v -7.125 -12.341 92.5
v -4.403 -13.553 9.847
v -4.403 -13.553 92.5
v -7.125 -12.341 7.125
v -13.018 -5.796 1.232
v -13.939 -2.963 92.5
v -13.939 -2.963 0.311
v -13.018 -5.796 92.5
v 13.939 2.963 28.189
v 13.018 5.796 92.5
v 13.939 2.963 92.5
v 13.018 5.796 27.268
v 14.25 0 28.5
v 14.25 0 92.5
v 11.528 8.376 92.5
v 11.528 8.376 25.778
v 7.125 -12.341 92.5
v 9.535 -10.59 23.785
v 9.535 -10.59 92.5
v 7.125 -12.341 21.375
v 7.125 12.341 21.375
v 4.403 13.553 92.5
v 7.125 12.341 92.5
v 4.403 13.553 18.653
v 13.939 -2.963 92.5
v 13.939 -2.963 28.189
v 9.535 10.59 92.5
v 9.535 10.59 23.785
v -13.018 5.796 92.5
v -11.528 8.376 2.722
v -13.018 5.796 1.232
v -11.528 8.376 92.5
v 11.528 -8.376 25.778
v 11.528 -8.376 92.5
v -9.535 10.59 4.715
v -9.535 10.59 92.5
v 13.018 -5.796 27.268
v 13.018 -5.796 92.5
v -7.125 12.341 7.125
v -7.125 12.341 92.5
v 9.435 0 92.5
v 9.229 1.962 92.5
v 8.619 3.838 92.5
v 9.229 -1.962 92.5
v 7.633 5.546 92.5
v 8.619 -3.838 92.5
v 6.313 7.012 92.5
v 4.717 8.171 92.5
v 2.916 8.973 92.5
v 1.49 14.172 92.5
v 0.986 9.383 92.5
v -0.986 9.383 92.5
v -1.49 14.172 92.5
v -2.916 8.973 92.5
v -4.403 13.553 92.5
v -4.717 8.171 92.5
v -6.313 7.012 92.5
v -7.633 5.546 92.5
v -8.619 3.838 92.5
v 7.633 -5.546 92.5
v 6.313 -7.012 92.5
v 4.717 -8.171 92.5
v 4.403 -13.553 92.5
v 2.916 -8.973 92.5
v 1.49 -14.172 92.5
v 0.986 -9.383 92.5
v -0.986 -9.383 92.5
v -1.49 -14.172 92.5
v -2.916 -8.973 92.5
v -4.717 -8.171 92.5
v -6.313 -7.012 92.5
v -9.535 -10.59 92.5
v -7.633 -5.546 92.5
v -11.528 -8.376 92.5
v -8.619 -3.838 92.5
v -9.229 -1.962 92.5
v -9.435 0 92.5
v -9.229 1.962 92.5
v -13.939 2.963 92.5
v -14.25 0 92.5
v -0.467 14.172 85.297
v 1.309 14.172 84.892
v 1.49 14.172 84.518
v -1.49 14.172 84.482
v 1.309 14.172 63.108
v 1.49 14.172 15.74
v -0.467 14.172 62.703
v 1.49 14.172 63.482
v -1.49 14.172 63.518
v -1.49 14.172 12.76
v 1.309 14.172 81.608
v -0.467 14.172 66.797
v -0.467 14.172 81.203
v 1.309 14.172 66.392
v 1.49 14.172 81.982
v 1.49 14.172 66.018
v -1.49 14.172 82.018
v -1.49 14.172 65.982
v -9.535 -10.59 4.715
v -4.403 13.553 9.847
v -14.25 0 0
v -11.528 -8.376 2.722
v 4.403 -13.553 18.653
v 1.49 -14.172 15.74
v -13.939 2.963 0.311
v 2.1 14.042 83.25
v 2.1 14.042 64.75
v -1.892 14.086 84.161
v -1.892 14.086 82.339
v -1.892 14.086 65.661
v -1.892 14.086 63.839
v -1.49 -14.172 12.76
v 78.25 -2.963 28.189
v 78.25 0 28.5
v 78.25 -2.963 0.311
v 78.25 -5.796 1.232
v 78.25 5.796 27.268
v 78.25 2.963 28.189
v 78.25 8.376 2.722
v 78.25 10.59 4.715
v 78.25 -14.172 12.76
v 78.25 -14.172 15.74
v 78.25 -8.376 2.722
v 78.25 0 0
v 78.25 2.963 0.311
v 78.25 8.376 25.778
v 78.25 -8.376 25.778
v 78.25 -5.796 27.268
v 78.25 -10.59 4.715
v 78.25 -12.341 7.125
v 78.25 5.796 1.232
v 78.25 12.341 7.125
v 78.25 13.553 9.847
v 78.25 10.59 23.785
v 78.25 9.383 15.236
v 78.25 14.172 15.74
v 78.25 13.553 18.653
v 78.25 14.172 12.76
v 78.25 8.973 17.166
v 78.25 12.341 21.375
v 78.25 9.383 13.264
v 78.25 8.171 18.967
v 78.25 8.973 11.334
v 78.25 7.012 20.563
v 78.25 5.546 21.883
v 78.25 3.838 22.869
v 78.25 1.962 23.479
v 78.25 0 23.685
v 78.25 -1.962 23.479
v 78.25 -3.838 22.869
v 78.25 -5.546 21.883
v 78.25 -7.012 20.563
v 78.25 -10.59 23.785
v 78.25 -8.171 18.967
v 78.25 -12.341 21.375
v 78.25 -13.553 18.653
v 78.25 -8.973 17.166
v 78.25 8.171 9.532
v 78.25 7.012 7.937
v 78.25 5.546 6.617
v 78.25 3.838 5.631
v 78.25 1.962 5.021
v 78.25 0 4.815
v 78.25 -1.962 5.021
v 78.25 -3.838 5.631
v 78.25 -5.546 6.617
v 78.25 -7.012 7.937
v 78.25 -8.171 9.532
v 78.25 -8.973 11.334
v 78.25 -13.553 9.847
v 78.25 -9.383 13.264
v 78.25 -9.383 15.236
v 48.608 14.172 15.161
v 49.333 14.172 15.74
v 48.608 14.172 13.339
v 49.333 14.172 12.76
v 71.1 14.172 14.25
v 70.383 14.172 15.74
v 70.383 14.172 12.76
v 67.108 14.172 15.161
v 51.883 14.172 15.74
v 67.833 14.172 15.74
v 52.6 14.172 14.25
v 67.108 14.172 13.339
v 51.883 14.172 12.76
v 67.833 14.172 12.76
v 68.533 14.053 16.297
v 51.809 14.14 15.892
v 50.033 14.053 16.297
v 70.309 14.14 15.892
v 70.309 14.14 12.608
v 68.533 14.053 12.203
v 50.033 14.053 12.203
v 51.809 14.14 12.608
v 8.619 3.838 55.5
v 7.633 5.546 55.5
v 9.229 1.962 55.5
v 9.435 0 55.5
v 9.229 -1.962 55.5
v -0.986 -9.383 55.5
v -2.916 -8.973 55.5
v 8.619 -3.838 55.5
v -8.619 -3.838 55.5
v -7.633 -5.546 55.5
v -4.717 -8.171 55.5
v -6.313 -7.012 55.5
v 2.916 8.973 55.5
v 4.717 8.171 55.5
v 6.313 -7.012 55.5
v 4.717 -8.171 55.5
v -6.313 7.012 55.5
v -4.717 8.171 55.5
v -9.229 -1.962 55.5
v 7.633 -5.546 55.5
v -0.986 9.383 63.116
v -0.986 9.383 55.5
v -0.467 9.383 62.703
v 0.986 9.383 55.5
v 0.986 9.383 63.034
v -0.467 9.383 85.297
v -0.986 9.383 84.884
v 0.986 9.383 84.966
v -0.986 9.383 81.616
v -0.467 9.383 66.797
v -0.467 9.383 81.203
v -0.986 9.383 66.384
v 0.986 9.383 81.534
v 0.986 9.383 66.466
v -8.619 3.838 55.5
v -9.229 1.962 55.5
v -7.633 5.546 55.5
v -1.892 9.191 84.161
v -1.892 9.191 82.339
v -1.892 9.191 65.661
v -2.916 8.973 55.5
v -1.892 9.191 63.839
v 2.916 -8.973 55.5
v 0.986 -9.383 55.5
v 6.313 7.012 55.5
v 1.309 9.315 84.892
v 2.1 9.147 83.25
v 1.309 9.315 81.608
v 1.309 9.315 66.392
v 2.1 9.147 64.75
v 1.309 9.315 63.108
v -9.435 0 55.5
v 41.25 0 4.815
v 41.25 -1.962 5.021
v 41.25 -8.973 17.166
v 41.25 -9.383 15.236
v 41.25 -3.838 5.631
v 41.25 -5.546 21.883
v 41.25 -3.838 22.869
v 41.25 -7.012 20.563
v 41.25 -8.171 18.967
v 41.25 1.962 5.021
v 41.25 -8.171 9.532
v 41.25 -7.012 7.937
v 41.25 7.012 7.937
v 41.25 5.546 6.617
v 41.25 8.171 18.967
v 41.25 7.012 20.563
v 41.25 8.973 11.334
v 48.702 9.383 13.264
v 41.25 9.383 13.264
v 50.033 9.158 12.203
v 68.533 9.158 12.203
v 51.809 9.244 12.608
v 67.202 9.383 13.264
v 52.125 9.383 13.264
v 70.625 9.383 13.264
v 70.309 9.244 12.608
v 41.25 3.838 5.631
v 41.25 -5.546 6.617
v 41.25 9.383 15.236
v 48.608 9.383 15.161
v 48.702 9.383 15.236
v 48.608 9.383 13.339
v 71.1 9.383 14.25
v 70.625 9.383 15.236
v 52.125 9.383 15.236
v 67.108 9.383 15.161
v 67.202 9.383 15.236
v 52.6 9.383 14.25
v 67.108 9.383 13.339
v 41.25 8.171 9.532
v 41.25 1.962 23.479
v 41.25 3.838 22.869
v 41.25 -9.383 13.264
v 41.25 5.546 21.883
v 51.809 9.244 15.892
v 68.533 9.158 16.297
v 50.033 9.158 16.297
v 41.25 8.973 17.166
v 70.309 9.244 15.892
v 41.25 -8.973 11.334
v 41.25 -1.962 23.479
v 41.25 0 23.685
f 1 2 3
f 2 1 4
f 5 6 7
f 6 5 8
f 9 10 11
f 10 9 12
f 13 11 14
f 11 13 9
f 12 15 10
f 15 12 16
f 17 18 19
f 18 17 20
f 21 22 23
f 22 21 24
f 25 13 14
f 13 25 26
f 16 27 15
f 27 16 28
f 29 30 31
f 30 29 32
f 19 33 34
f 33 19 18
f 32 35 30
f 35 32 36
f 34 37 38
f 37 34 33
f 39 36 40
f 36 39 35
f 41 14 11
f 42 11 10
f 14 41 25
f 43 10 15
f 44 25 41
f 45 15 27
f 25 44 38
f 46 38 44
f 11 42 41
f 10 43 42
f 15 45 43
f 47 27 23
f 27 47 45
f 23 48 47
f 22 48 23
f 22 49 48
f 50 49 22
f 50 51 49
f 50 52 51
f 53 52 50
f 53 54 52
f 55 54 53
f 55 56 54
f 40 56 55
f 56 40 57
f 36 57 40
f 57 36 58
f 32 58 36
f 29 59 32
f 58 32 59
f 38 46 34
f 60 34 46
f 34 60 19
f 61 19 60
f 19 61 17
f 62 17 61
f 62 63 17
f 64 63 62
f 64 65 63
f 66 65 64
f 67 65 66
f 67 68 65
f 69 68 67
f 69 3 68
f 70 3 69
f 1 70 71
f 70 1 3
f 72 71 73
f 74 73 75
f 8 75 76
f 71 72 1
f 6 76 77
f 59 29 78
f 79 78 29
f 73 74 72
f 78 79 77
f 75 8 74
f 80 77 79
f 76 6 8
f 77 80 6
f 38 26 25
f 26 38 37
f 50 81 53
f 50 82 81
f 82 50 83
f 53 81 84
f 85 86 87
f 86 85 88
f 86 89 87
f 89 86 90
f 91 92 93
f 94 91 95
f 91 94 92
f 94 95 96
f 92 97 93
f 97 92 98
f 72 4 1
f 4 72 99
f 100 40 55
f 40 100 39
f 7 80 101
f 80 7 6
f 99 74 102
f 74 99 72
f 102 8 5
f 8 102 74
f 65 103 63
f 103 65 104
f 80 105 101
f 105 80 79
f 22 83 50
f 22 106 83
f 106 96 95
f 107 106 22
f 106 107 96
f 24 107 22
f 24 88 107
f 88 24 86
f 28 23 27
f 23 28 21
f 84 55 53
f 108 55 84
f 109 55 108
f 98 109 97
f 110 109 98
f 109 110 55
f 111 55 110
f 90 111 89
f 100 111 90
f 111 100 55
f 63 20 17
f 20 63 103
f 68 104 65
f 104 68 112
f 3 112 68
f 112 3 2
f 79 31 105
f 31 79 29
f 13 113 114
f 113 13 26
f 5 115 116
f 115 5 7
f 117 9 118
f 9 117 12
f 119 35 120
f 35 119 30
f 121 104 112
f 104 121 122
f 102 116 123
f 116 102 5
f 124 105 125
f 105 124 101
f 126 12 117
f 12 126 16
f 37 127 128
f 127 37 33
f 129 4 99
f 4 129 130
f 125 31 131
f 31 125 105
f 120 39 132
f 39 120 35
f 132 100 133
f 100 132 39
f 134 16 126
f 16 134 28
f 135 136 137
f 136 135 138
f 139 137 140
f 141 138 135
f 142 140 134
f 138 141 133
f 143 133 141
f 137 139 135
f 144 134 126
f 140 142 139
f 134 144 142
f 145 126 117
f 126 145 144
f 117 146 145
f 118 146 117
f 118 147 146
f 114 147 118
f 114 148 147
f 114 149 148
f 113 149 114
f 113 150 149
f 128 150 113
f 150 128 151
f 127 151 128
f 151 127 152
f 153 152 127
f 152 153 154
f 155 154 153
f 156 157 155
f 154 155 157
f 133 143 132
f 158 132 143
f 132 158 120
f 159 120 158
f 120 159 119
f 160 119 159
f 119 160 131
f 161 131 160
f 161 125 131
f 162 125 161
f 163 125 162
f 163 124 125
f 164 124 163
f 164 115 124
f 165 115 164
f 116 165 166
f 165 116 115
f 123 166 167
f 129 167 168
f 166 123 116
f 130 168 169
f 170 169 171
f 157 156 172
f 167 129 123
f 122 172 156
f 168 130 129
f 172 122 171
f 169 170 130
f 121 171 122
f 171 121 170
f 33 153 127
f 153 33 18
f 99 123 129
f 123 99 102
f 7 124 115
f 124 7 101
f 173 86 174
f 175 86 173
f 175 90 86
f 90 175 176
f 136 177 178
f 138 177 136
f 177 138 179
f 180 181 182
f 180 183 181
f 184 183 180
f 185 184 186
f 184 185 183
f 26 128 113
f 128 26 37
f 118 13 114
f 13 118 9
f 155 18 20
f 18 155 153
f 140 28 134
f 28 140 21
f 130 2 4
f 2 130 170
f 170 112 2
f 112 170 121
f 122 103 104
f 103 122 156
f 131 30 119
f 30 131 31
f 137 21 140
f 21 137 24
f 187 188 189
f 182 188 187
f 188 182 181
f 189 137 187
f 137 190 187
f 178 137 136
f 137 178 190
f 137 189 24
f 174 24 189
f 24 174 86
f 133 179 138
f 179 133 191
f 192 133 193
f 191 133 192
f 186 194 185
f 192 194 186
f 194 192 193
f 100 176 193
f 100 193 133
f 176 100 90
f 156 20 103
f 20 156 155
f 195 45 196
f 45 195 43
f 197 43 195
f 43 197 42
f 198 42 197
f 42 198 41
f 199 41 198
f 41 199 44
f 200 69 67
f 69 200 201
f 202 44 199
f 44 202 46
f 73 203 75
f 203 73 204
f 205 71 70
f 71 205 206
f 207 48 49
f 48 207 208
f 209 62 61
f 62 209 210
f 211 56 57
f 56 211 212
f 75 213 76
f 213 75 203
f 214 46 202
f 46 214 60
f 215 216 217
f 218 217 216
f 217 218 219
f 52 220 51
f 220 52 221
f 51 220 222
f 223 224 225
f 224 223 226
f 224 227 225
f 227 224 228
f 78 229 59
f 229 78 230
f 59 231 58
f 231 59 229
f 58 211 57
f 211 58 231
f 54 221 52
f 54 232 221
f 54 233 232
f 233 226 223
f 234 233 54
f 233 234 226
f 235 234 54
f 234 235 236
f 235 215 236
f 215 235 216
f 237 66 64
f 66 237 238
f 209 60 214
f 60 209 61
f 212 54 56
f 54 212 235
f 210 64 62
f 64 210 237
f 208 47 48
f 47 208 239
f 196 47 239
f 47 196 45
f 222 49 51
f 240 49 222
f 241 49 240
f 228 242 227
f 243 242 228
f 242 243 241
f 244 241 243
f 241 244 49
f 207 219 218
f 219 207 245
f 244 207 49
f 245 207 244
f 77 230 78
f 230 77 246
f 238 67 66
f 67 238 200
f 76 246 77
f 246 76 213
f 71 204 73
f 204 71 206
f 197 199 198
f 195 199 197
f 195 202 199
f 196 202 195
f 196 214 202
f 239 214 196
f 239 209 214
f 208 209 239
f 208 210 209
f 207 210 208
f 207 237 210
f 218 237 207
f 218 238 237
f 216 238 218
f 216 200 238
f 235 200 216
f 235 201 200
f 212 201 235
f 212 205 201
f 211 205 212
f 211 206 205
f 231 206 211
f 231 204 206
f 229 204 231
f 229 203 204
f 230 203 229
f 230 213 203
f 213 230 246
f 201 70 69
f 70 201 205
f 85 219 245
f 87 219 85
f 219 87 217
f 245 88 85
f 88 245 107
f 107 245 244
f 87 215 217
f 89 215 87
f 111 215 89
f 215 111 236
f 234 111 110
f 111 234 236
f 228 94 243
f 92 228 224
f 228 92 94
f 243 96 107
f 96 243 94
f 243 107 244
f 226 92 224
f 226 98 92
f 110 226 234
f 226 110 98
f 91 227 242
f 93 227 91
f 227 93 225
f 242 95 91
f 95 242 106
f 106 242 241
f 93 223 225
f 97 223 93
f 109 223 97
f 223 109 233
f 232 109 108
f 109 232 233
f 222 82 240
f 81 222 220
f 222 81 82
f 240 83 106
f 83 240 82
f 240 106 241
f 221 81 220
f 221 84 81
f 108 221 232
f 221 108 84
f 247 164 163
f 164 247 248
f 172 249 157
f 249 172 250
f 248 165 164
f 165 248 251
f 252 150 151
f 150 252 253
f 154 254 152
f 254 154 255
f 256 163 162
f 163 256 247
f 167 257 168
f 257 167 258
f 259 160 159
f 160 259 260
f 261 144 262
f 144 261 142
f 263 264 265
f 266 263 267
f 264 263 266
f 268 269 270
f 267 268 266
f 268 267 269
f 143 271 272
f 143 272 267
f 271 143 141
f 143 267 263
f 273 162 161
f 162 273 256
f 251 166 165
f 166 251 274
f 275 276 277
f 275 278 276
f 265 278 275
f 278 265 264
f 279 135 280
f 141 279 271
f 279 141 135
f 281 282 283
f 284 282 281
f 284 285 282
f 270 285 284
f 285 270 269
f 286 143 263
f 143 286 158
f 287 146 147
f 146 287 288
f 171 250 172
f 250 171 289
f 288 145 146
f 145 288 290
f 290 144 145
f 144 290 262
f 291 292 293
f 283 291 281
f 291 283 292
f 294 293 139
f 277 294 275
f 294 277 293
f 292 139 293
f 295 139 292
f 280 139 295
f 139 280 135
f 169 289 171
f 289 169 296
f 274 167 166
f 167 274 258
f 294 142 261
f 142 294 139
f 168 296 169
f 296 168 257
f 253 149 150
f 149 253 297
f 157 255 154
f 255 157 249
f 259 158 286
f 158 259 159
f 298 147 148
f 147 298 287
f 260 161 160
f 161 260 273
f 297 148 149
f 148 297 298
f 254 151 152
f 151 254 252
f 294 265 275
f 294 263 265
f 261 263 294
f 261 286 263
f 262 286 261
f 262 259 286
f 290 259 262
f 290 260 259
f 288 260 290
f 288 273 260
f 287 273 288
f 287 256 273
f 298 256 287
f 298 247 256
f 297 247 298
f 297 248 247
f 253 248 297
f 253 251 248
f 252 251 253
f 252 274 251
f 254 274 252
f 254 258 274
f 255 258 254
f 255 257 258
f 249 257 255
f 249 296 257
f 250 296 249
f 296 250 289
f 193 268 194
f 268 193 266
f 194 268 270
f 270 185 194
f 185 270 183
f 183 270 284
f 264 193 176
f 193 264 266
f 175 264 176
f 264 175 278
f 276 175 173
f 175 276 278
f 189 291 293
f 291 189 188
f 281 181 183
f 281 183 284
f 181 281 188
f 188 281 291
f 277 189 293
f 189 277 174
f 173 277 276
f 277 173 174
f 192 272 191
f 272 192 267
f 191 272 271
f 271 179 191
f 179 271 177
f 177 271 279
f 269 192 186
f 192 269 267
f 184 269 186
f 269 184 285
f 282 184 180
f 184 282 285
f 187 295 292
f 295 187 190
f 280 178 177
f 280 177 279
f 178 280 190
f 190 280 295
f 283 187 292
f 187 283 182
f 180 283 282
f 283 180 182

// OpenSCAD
/* [Body] */
Shell_Thickness = 5;

/* [Conduit] */
Conduit_Diameter = 18.5;
Printer_Fudge = 1.02;
/* [Hardware] */ 
Screw_thread = 3;
Heatset_Diameter = 4.2;
difference(){
    union(){    
        difference() {//Verticle
                cylinder(h = Conduit_Diameter*5, d = Conduit_Diameter+(Shell_Thickness*2));
                translate([-(Conduit_Diameter/2+Shell_Thickness),0,0]) rotate([0,-45,0]) translate([0,0,-Conduit_Diameter/2-Shell_Thickness]) cube([Conduit_Diameter*8,Conduit_Diameter+Shell_Thickness*2,Conduit_Diameter+Shell_Thickness*2],center=true);
            }
        difference() {//Horizontal
                translate([-(Conduit_Diameter/2)-Shell_Thickness,0,+Conduit_Diameter/2+Shell_Thickness]) rotate([0,90,0])cylinder(h = Conduit_Diameter*5, d = Conduit_Diameter+(Shell_Thickness*2));
                translate([-(Conduit_Diameter/2+Shell_Thickness),0,0]) rotate([0,-45,0]) translate([0,0,(Conduit_Diameter+2*Shell_Thickness)/2]) cube([Conduit_Diameter*8,Conduit_Diameter+Shell_Thickness*2,Conduit_Diameter+2*Shell_Thickness],center=true);
                
            }
    }
    translate([0,0,3*Conduit_Diameter]) cylinder(h=2*Conduit_Diameter+0.01, d=Conduit_Diameter*Printer_Fudge);
    translate([0,Conduit_Diameter/2-1,Conduit_Diameter*3.5])#rotate([-90,0,0]) cylinder(h = Shell_Thickness+2, d=Heatset_Diameter);
    translate([0,Conduit_Diameter/2-1,Conduit_Diameter*4.5])#rotate([-90,0,0]) cylinder(h = Shell_Thickness+2, d=Heatset_Diameter); 
    translate([2.5*Conduit_Diameter-Shell_Thickness,0,(Conduit_Diameter+Shell_Thickness*2)/2]) rotate([0,90,0]) cylinder(h=2*Conduit_Diameter+0.01, d=Conduit_Diameter*Printer_Fudge);
    translate([Conduit_Diameter*3-Shell_Thickness,Conduit_Diameter/2-1,(Conduit_Diameter+Shell_Thickness*2)/2])#rotate([-90,0,0]) cylinder(h = Shell_Thickness+2, d=Heatset_Diameter);
    translate([Conduit_Diameter*4-Shell_Thickness,Conduit_Diameter/2-1,(Conduit_Diameter+Shell_Thickness*2)/2])#rotate([-90,0,0]) cylinder(h = Shell_Thickness+2, d=Heatset_Diameter); 

}
